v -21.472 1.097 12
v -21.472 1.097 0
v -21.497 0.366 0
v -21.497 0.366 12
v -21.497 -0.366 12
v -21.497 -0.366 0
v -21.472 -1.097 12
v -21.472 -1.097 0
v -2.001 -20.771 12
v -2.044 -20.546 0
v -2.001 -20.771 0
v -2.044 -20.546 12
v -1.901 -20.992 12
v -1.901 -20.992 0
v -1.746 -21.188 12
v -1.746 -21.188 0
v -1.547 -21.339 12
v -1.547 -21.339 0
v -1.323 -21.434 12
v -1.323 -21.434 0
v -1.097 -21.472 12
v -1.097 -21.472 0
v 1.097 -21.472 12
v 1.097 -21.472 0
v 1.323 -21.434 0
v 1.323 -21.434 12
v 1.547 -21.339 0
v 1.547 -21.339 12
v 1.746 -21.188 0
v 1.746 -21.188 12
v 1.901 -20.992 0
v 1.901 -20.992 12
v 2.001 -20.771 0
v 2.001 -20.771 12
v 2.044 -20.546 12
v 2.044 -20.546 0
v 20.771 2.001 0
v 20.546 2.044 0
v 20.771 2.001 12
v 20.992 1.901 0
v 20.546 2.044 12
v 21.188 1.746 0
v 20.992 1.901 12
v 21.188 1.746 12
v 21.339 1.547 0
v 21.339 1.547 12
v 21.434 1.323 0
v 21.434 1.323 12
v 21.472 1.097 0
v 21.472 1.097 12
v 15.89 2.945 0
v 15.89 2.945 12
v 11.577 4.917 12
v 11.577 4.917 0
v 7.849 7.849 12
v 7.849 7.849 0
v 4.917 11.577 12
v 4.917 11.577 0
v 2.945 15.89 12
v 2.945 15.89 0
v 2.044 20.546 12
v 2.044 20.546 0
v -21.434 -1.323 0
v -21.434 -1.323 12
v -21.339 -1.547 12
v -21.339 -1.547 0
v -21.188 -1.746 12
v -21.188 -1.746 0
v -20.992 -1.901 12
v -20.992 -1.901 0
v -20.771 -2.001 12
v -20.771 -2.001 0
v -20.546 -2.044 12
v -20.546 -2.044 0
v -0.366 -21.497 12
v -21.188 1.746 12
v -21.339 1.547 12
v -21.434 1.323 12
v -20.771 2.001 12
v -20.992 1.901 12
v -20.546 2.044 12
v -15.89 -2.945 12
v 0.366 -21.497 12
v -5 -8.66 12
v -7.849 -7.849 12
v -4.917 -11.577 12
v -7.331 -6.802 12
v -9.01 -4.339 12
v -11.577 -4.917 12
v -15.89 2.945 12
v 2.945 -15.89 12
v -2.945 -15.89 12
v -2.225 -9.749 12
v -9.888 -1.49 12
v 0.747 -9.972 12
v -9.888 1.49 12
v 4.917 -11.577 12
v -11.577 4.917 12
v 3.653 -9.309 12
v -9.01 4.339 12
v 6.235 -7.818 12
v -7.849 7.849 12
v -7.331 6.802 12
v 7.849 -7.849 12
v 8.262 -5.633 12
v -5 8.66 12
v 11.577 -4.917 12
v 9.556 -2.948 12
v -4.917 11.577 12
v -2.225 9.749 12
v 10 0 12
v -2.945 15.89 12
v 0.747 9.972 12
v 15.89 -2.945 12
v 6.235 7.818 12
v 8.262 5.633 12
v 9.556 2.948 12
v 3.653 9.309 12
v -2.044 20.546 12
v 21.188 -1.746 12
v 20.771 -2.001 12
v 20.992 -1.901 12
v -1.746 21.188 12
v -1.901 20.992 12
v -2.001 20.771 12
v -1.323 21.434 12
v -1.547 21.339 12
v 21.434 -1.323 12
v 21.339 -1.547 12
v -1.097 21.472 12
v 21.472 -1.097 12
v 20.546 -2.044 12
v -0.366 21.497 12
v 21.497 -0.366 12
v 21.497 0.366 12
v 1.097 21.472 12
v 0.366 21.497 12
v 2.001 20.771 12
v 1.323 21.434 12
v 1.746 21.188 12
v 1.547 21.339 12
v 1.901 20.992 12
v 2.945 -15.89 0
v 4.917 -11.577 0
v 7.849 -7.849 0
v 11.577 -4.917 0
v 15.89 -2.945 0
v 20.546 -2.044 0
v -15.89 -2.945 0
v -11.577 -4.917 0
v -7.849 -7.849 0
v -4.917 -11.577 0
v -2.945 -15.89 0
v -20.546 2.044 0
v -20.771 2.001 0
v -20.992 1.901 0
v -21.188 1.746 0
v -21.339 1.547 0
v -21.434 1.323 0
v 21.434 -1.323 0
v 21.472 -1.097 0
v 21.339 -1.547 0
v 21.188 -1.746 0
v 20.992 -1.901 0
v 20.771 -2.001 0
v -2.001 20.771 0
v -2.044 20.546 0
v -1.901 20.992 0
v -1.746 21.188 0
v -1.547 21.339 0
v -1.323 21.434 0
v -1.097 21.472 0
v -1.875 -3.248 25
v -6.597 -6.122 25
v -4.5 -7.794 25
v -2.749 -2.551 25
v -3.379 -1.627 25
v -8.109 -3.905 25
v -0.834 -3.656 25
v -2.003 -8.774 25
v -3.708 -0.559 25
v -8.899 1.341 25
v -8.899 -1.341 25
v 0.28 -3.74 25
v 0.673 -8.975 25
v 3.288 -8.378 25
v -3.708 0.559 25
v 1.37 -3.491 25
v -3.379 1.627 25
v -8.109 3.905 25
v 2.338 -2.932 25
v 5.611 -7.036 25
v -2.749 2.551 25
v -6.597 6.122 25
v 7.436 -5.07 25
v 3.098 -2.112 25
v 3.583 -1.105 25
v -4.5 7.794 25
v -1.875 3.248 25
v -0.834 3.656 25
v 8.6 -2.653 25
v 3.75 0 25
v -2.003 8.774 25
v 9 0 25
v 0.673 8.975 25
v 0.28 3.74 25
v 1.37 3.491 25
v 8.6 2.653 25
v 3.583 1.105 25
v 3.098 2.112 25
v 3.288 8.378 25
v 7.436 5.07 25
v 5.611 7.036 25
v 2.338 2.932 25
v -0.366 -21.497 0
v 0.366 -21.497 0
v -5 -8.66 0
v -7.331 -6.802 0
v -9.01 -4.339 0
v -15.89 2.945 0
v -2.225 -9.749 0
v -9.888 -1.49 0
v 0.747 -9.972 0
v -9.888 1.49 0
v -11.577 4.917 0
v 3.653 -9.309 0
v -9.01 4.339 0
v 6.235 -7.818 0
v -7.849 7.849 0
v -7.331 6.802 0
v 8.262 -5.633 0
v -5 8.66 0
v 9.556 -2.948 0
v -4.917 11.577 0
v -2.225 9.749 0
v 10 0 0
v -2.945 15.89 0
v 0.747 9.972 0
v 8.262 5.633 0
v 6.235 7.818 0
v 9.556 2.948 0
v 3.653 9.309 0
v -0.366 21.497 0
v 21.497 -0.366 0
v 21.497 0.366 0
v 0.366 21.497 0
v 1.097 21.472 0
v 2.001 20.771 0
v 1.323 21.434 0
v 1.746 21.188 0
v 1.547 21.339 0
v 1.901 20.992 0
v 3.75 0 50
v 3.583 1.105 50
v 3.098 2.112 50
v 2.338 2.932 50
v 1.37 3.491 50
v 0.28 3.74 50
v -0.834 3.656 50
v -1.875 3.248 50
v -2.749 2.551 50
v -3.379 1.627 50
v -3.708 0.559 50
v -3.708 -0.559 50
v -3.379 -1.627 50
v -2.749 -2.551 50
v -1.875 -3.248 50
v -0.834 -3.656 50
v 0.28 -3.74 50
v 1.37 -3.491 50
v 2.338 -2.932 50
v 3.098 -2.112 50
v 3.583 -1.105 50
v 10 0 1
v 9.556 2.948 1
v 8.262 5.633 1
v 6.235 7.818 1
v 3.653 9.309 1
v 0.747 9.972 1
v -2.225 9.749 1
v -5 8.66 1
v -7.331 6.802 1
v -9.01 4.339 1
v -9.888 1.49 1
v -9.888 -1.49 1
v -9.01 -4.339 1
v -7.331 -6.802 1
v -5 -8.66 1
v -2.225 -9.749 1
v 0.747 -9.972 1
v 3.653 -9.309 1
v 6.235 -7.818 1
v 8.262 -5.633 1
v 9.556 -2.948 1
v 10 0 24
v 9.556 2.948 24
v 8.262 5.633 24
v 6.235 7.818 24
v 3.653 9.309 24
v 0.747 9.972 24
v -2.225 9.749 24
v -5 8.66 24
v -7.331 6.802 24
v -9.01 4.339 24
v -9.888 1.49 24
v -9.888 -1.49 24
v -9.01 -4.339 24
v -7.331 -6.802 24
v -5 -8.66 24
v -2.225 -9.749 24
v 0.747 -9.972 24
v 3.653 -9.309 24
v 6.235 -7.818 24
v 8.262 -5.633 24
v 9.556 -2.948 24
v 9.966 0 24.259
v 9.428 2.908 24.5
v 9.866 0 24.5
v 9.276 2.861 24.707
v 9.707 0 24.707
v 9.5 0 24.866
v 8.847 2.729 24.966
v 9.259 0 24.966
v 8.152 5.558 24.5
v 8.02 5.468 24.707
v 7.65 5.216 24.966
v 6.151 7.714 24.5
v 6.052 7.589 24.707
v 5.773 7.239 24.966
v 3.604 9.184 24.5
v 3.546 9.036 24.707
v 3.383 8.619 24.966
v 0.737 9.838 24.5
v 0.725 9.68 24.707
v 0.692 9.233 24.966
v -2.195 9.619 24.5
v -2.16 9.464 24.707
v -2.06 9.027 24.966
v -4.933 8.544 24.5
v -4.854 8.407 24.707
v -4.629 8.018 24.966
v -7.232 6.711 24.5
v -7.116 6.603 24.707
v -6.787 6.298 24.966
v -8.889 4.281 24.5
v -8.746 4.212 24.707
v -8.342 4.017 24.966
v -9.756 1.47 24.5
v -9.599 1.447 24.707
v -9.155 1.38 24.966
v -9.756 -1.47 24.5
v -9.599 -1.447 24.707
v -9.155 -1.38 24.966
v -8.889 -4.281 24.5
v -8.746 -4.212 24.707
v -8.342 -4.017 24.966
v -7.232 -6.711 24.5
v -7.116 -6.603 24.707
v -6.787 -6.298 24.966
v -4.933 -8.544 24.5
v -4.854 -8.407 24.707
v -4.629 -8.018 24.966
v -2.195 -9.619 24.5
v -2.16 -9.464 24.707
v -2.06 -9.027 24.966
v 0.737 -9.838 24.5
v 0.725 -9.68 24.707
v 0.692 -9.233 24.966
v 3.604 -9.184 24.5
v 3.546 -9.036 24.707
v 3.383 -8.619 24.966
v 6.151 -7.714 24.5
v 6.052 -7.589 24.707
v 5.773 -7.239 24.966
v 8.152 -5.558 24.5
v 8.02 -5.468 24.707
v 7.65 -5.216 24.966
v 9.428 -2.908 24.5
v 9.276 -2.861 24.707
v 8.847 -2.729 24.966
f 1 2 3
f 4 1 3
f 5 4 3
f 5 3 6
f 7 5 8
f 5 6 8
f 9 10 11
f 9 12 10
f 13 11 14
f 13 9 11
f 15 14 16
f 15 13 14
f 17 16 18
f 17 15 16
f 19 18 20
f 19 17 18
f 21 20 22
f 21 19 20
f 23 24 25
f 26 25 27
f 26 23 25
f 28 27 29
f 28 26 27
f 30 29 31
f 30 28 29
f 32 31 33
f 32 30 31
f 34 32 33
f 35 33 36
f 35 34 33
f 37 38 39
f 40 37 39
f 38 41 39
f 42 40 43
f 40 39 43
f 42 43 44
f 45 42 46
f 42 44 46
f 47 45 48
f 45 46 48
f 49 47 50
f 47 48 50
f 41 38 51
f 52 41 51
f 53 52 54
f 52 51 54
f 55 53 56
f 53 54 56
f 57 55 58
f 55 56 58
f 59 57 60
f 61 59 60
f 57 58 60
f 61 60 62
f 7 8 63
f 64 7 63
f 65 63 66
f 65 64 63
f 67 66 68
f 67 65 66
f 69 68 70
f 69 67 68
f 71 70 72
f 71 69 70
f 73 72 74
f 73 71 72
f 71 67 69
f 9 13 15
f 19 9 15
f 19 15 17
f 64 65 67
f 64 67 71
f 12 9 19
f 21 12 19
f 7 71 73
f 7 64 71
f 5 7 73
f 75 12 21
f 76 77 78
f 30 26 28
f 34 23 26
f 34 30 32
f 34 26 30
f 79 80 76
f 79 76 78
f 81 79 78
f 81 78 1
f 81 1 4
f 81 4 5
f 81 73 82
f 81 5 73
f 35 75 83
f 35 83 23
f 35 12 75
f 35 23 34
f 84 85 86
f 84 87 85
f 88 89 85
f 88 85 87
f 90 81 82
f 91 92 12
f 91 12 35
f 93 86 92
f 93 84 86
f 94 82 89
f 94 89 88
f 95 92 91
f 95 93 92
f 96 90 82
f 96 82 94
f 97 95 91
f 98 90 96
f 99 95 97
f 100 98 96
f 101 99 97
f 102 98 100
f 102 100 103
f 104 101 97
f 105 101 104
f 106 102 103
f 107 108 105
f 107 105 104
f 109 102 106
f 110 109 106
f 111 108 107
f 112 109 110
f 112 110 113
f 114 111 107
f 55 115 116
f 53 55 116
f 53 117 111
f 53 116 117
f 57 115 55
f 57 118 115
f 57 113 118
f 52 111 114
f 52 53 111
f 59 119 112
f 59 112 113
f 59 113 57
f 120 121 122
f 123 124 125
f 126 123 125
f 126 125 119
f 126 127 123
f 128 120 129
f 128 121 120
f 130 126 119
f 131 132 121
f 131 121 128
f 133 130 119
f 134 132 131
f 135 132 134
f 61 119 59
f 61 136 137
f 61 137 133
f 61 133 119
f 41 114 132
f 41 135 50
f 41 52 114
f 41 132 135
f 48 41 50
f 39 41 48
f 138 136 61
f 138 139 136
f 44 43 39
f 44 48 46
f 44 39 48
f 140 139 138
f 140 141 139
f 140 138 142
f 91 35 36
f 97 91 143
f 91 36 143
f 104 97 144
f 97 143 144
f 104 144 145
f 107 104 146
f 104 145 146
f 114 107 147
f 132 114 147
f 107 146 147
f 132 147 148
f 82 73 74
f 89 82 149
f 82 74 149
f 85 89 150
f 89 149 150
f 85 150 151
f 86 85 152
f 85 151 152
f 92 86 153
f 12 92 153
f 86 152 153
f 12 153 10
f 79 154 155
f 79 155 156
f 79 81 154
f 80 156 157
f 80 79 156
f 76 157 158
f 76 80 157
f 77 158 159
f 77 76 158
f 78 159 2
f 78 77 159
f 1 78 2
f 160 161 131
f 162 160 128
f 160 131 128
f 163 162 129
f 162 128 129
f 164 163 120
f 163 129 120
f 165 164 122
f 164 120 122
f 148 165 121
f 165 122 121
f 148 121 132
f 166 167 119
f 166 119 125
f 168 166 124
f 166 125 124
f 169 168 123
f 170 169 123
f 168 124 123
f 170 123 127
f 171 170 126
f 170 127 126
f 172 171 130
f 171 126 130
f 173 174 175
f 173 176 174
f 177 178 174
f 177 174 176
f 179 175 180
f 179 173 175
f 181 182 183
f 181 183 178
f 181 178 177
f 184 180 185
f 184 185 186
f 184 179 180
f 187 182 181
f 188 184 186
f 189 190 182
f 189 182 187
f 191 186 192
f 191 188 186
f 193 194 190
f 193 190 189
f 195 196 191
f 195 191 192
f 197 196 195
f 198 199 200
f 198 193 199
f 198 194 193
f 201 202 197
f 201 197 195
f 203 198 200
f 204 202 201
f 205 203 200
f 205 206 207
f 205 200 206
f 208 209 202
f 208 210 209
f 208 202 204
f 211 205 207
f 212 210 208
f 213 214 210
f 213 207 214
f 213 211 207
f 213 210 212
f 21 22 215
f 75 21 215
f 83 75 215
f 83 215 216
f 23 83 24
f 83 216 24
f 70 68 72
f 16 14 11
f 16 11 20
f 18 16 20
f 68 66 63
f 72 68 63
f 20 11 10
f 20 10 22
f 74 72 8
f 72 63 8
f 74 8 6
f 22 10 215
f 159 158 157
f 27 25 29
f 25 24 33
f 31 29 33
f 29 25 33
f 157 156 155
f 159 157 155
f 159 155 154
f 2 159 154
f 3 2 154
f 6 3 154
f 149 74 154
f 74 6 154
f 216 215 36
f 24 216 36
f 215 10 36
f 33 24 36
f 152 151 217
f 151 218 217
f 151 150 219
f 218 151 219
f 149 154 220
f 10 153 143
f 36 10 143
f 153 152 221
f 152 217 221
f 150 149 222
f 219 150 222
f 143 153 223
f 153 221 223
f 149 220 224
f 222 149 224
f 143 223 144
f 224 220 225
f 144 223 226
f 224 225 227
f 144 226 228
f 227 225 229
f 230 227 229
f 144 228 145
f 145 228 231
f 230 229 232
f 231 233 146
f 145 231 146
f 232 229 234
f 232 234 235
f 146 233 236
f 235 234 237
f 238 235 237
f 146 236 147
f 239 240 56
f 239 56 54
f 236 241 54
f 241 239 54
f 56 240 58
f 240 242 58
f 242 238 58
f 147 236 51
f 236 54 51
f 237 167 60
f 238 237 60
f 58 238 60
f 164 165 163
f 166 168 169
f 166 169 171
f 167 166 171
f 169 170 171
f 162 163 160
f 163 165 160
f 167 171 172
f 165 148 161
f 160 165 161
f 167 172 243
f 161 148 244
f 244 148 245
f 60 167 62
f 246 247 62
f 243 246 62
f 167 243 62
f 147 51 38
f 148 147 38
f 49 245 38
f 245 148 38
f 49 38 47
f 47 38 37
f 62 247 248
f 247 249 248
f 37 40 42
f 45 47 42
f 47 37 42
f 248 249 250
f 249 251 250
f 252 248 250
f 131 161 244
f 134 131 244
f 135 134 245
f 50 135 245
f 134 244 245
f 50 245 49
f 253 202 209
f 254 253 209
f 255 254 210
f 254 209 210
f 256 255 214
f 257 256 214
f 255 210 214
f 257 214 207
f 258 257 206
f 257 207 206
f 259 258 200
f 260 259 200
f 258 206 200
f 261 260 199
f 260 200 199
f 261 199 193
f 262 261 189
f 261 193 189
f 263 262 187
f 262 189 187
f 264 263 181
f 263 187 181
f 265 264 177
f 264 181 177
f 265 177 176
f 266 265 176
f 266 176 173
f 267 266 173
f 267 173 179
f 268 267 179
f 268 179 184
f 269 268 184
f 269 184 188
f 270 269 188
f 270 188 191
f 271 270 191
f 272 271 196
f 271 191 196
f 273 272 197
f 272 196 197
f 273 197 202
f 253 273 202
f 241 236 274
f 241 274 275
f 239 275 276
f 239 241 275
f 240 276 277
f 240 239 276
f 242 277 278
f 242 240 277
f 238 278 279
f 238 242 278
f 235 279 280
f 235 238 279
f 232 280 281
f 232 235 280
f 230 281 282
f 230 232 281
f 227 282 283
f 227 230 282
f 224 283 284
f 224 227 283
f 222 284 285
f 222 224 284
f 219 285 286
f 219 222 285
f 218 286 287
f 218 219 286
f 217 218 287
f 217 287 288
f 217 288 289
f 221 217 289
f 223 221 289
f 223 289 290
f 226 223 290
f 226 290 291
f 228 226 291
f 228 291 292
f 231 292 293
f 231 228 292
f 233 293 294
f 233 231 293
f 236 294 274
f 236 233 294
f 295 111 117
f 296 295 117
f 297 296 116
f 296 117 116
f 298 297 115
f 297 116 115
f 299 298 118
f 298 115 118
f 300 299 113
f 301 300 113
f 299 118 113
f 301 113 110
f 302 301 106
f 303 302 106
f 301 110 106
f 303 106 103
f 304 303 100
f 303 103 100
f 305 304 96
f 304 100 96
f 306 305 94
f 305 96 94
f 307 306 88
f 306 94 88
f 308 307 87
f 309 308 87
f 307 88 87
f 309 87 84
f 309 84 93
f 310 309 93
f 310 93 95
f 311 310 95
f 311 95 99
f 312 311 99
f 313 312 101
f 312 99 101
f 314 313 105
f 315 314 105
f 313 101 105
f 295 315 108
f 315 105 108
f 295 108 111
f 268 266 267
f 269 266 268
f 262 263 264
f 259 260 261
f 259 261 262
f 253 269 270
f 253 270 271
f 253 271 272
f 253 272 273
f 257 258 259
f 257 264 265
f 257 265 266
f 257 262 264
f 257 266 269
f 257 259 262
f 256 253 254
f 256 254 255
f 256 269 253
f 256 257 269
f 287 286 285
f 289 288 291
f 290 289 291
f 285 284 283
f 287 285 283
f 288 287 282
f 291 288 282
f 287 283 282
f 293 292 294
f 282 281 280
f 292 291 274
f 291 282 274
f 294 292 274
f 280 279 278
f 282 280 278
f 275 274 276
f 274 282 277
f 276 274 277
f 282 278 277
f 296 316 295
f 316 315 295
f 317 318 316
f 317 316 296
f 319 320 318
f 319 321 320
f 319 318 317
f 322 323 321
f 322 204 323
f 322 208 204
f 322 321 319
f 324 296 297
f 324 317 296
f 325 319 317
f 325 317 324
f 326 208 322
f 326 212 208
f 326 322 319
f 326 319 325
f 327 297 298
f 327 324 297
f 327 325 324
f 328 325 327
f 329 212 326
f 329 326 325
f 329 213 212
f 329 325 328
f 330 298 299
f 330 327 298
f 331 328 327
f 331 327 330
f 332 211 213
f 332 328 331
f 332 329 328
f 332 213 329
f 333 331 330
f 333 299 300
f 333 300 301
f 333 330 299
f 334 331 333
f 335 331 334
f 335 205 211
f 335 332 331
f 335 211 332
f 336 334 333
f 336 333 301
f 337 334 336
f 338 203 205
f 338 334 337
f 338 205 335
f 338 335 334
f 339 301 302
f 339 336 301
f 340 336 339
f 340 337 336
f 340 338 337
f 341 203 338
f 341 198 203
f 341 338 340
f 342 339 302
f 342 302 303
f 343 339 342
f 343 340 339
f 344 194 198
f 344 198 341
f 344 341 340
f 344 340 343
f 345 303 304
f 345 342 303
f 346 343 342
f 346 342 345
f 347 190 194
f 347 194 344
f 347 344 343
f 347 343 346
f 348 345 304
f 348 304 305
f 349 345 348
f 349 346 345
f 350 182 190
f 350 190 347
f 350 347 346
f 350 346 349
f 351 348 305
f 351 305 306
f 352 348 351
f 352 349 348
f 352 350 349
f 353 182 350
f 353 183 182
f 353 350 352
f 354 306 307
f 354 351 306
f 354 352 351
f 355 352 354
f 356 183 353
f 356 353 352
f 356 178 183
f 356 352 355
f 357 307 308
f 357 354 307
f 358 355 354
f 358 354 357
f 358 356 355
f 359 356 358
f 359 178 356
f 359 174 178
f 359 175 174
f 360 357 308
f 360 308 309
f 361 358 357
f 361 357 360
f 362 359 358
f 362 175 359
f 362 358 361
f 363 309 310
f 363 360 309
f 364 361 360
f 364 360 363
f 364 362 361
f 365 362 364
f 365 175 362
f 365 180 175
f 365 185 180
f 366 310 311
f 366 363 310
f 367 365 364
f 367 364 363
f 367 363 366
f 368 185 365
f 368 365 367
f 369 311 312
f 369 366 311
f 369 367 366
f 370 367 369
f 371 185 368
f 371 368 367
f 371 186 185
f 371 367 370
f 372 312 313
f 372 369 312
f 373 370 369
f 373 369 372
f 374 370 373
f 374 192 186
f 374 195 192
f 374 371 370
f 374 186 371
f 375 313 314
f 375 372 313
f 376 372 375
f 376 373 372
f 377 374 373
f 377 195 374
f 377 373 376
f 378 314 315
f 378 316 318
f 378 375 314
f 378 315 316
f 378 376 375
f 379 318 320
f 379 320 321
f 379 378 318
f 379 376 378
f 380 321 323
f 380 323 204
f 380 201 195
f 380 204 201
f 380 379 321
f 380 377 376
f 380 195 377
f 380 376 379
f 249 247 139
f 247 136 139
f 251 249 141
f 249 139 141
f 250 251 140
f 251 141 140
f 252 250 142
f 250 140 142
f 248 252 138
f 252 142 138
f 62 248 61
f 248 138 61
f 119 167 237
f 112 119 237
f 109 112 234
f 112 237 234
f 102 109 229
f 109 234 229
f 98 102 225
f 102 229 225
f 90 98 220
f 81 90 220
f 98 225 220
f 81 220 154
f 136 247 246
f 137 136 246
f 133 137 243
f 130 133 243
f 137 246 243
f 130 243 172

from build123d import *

# Parameters (mm, degrees)
F0_R     = 10
F1_DEPTH = 12
F2_R     = 10
F3_DEPTH = 13
F4_R     = 3.75
F5_DEPTH = 25
F6_R     = 1
F7_R     = 1
F8_DEPTH = 1


with BuildPart() as f1:
    # F0 (on Top) → F1 (new body)
    with BuildSketch(Plane.XY):
        with BuildLine():
            ThreePointArc((-2, 21.4067746286), (-7.8493163593, 7.8493163593), (-21.4067746286, 2))
            ThreePointArc((-21.4067746286, 2), (-21.5, 0), (-21.4067746286, -2))
            ThreePointArc((-21.4067746286, -2), (-7.8493163593, -7.8493163593), (-2, -21.4067746286))
            ThreePointArc((-2, -21.4067746286), (0, -21.5), (2, -21.4067746286))
            ThreePointArc((2, -21.4067746286), (7.8493163593, -7.8493163593), (21.4067746286, -2))
            ThreePointArc((21.4067746286, -2), (21.5, 0), (21.4067746286, 2))
            ThreePointArc((21.4067746286, 2), (7.8493163593, 7.8493163593), (2, 21.4067746286))
            ThreePointArc((2, 21.4067746286), (0, 21.5), (-2, 21.4067746286))
        make_face()
        Circle(F0_R, mode=Mode.SUBTRACT)
        Circle(F0_R)
    extrude(amount=F1_DEPTH)

    # F2 (on face) → F3 (join)
    with BuildSketch(Plane.XY.offset(12)):
        Circle(F2_R)
    extrude(amount=F3_DEPTH)

    # F4 (on face) → F5 (join)
    with BuildSketch(Plane.XY.offset(25)):
        Circle(F4_R)
    extrude(amount=F5_DEPTH)

    # F6
    f6_edges = [f1.edges().sort_by_distance(p)[0] for p in [
        (-10, 0, 25),
    ]]
    fillet(f6_edges, radius=F6_R)

    # F7
    f7_edges = [f1.edges().sort_by_distance(p)[0] for p in [
        (-2, -21.406775, 6),
        (2, -21.406775, 6),
        (-21.406775, -2, 6),
        (-21.406775, 2, 6),
        (-2, 21.406775, 6),
        (2, 21.406775, 6),
        (21.406775, 2, 6),
        (21.406775, -2, 6),
    ]]
    fillet(f7_edges, radius=F7_R)

    # F0 (on Top) → F8 (cut)
    with BuildSketch(Plane.XY):
        Circle(F0_R)
    extrude(amount=F8_DEPTH, mode=Mode.SUBTRACT)


solid = f1.part
